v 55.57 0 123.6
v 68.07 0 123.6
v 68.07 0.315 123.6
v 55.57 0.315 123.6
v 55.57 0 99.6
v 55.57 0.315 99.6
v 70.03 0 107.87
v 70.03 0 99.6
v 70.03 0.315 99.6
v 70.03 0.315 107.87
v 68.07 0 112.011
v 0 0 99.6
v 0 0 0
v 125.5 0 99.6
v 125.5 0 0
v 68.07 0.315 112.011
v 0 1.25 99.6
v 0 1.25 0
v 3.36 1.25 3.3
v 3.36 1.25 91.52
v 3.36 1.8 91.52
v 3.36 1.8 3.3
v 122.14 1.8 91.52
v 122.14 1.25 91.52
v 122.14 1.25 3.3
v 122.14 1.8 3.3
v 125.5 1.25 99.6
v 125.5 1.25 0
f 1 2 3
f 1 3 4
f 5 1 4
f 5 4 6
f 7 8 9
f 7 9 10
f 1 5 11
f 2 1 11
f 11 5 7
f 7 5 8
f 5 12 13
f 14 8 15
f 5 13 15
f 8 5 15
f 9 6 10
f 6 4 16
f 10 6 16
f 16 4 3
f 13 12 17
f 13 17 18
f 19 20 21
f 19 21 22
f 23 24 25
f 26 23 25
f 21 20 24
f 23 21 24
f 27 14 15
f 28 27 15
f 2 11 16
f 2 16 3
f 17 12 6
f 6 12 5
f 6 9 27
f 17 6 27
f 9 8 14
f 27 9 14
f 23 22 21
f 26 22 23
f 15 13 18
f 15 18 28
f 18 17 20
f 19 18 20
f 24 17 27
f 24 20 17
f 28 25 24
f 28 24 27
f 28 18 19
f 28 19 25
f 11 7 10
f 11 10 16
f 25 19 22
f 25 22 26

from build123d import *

# Parameters (mm, degrees)
SKETCH1_W           = 125.5
SKETCH1_H           = 99.6
BOSS_EXTRUDE1_DEPTH = 1.25
SKETCH2_W           = 118.78
SKETCH2_H           = 88.22
BOSS_EXTRUDE2_DEPTH = 0.55
BOSS_EXTRUDE3_DEPTH = 0.315


with BuildPart() as part:
    # Sketch1 → Boss-Extrude1 (new body)
    with BuildSketch(Plane(origin=(0, 0, 0), x_dir=(1, 0, 0), z_dir=(0, 1, 0))):
        with Locations((62.75, -49.8)):
            Rectangle(SKETCH1_W, SKETCH1_H)
    extrude(amount=BOSS_EXTRUDE1_DEPTH)

    # Sketch2 → Boss-Extrude2 (add)
    with BuildSketch(Plane(origin=(0, 1.25, 0), x_dir=(1, 0, 0), z_dir=(0, 1, 0))):
        with Locations((62.75, -47.41)):
            Rectangle(SKETCH2_W, SKETCH2_H)
    extrude(amount=BOSS_EXTRUDE2_DEPTH)

    # Sketch3 → Boss-Extrude3 (add)
    with BuildSketch(Plane.XZ):
        Polygon((55.57, 99.6), (70.03, 99.6), (70.03, 107.87048089), (68.07, 112.011323717), (68.07, 123.6), (55.57, 123.6), align=None)
    extrude(amount=-BOSS_EXTRUDE3_DEPTH)


solid = part.part
